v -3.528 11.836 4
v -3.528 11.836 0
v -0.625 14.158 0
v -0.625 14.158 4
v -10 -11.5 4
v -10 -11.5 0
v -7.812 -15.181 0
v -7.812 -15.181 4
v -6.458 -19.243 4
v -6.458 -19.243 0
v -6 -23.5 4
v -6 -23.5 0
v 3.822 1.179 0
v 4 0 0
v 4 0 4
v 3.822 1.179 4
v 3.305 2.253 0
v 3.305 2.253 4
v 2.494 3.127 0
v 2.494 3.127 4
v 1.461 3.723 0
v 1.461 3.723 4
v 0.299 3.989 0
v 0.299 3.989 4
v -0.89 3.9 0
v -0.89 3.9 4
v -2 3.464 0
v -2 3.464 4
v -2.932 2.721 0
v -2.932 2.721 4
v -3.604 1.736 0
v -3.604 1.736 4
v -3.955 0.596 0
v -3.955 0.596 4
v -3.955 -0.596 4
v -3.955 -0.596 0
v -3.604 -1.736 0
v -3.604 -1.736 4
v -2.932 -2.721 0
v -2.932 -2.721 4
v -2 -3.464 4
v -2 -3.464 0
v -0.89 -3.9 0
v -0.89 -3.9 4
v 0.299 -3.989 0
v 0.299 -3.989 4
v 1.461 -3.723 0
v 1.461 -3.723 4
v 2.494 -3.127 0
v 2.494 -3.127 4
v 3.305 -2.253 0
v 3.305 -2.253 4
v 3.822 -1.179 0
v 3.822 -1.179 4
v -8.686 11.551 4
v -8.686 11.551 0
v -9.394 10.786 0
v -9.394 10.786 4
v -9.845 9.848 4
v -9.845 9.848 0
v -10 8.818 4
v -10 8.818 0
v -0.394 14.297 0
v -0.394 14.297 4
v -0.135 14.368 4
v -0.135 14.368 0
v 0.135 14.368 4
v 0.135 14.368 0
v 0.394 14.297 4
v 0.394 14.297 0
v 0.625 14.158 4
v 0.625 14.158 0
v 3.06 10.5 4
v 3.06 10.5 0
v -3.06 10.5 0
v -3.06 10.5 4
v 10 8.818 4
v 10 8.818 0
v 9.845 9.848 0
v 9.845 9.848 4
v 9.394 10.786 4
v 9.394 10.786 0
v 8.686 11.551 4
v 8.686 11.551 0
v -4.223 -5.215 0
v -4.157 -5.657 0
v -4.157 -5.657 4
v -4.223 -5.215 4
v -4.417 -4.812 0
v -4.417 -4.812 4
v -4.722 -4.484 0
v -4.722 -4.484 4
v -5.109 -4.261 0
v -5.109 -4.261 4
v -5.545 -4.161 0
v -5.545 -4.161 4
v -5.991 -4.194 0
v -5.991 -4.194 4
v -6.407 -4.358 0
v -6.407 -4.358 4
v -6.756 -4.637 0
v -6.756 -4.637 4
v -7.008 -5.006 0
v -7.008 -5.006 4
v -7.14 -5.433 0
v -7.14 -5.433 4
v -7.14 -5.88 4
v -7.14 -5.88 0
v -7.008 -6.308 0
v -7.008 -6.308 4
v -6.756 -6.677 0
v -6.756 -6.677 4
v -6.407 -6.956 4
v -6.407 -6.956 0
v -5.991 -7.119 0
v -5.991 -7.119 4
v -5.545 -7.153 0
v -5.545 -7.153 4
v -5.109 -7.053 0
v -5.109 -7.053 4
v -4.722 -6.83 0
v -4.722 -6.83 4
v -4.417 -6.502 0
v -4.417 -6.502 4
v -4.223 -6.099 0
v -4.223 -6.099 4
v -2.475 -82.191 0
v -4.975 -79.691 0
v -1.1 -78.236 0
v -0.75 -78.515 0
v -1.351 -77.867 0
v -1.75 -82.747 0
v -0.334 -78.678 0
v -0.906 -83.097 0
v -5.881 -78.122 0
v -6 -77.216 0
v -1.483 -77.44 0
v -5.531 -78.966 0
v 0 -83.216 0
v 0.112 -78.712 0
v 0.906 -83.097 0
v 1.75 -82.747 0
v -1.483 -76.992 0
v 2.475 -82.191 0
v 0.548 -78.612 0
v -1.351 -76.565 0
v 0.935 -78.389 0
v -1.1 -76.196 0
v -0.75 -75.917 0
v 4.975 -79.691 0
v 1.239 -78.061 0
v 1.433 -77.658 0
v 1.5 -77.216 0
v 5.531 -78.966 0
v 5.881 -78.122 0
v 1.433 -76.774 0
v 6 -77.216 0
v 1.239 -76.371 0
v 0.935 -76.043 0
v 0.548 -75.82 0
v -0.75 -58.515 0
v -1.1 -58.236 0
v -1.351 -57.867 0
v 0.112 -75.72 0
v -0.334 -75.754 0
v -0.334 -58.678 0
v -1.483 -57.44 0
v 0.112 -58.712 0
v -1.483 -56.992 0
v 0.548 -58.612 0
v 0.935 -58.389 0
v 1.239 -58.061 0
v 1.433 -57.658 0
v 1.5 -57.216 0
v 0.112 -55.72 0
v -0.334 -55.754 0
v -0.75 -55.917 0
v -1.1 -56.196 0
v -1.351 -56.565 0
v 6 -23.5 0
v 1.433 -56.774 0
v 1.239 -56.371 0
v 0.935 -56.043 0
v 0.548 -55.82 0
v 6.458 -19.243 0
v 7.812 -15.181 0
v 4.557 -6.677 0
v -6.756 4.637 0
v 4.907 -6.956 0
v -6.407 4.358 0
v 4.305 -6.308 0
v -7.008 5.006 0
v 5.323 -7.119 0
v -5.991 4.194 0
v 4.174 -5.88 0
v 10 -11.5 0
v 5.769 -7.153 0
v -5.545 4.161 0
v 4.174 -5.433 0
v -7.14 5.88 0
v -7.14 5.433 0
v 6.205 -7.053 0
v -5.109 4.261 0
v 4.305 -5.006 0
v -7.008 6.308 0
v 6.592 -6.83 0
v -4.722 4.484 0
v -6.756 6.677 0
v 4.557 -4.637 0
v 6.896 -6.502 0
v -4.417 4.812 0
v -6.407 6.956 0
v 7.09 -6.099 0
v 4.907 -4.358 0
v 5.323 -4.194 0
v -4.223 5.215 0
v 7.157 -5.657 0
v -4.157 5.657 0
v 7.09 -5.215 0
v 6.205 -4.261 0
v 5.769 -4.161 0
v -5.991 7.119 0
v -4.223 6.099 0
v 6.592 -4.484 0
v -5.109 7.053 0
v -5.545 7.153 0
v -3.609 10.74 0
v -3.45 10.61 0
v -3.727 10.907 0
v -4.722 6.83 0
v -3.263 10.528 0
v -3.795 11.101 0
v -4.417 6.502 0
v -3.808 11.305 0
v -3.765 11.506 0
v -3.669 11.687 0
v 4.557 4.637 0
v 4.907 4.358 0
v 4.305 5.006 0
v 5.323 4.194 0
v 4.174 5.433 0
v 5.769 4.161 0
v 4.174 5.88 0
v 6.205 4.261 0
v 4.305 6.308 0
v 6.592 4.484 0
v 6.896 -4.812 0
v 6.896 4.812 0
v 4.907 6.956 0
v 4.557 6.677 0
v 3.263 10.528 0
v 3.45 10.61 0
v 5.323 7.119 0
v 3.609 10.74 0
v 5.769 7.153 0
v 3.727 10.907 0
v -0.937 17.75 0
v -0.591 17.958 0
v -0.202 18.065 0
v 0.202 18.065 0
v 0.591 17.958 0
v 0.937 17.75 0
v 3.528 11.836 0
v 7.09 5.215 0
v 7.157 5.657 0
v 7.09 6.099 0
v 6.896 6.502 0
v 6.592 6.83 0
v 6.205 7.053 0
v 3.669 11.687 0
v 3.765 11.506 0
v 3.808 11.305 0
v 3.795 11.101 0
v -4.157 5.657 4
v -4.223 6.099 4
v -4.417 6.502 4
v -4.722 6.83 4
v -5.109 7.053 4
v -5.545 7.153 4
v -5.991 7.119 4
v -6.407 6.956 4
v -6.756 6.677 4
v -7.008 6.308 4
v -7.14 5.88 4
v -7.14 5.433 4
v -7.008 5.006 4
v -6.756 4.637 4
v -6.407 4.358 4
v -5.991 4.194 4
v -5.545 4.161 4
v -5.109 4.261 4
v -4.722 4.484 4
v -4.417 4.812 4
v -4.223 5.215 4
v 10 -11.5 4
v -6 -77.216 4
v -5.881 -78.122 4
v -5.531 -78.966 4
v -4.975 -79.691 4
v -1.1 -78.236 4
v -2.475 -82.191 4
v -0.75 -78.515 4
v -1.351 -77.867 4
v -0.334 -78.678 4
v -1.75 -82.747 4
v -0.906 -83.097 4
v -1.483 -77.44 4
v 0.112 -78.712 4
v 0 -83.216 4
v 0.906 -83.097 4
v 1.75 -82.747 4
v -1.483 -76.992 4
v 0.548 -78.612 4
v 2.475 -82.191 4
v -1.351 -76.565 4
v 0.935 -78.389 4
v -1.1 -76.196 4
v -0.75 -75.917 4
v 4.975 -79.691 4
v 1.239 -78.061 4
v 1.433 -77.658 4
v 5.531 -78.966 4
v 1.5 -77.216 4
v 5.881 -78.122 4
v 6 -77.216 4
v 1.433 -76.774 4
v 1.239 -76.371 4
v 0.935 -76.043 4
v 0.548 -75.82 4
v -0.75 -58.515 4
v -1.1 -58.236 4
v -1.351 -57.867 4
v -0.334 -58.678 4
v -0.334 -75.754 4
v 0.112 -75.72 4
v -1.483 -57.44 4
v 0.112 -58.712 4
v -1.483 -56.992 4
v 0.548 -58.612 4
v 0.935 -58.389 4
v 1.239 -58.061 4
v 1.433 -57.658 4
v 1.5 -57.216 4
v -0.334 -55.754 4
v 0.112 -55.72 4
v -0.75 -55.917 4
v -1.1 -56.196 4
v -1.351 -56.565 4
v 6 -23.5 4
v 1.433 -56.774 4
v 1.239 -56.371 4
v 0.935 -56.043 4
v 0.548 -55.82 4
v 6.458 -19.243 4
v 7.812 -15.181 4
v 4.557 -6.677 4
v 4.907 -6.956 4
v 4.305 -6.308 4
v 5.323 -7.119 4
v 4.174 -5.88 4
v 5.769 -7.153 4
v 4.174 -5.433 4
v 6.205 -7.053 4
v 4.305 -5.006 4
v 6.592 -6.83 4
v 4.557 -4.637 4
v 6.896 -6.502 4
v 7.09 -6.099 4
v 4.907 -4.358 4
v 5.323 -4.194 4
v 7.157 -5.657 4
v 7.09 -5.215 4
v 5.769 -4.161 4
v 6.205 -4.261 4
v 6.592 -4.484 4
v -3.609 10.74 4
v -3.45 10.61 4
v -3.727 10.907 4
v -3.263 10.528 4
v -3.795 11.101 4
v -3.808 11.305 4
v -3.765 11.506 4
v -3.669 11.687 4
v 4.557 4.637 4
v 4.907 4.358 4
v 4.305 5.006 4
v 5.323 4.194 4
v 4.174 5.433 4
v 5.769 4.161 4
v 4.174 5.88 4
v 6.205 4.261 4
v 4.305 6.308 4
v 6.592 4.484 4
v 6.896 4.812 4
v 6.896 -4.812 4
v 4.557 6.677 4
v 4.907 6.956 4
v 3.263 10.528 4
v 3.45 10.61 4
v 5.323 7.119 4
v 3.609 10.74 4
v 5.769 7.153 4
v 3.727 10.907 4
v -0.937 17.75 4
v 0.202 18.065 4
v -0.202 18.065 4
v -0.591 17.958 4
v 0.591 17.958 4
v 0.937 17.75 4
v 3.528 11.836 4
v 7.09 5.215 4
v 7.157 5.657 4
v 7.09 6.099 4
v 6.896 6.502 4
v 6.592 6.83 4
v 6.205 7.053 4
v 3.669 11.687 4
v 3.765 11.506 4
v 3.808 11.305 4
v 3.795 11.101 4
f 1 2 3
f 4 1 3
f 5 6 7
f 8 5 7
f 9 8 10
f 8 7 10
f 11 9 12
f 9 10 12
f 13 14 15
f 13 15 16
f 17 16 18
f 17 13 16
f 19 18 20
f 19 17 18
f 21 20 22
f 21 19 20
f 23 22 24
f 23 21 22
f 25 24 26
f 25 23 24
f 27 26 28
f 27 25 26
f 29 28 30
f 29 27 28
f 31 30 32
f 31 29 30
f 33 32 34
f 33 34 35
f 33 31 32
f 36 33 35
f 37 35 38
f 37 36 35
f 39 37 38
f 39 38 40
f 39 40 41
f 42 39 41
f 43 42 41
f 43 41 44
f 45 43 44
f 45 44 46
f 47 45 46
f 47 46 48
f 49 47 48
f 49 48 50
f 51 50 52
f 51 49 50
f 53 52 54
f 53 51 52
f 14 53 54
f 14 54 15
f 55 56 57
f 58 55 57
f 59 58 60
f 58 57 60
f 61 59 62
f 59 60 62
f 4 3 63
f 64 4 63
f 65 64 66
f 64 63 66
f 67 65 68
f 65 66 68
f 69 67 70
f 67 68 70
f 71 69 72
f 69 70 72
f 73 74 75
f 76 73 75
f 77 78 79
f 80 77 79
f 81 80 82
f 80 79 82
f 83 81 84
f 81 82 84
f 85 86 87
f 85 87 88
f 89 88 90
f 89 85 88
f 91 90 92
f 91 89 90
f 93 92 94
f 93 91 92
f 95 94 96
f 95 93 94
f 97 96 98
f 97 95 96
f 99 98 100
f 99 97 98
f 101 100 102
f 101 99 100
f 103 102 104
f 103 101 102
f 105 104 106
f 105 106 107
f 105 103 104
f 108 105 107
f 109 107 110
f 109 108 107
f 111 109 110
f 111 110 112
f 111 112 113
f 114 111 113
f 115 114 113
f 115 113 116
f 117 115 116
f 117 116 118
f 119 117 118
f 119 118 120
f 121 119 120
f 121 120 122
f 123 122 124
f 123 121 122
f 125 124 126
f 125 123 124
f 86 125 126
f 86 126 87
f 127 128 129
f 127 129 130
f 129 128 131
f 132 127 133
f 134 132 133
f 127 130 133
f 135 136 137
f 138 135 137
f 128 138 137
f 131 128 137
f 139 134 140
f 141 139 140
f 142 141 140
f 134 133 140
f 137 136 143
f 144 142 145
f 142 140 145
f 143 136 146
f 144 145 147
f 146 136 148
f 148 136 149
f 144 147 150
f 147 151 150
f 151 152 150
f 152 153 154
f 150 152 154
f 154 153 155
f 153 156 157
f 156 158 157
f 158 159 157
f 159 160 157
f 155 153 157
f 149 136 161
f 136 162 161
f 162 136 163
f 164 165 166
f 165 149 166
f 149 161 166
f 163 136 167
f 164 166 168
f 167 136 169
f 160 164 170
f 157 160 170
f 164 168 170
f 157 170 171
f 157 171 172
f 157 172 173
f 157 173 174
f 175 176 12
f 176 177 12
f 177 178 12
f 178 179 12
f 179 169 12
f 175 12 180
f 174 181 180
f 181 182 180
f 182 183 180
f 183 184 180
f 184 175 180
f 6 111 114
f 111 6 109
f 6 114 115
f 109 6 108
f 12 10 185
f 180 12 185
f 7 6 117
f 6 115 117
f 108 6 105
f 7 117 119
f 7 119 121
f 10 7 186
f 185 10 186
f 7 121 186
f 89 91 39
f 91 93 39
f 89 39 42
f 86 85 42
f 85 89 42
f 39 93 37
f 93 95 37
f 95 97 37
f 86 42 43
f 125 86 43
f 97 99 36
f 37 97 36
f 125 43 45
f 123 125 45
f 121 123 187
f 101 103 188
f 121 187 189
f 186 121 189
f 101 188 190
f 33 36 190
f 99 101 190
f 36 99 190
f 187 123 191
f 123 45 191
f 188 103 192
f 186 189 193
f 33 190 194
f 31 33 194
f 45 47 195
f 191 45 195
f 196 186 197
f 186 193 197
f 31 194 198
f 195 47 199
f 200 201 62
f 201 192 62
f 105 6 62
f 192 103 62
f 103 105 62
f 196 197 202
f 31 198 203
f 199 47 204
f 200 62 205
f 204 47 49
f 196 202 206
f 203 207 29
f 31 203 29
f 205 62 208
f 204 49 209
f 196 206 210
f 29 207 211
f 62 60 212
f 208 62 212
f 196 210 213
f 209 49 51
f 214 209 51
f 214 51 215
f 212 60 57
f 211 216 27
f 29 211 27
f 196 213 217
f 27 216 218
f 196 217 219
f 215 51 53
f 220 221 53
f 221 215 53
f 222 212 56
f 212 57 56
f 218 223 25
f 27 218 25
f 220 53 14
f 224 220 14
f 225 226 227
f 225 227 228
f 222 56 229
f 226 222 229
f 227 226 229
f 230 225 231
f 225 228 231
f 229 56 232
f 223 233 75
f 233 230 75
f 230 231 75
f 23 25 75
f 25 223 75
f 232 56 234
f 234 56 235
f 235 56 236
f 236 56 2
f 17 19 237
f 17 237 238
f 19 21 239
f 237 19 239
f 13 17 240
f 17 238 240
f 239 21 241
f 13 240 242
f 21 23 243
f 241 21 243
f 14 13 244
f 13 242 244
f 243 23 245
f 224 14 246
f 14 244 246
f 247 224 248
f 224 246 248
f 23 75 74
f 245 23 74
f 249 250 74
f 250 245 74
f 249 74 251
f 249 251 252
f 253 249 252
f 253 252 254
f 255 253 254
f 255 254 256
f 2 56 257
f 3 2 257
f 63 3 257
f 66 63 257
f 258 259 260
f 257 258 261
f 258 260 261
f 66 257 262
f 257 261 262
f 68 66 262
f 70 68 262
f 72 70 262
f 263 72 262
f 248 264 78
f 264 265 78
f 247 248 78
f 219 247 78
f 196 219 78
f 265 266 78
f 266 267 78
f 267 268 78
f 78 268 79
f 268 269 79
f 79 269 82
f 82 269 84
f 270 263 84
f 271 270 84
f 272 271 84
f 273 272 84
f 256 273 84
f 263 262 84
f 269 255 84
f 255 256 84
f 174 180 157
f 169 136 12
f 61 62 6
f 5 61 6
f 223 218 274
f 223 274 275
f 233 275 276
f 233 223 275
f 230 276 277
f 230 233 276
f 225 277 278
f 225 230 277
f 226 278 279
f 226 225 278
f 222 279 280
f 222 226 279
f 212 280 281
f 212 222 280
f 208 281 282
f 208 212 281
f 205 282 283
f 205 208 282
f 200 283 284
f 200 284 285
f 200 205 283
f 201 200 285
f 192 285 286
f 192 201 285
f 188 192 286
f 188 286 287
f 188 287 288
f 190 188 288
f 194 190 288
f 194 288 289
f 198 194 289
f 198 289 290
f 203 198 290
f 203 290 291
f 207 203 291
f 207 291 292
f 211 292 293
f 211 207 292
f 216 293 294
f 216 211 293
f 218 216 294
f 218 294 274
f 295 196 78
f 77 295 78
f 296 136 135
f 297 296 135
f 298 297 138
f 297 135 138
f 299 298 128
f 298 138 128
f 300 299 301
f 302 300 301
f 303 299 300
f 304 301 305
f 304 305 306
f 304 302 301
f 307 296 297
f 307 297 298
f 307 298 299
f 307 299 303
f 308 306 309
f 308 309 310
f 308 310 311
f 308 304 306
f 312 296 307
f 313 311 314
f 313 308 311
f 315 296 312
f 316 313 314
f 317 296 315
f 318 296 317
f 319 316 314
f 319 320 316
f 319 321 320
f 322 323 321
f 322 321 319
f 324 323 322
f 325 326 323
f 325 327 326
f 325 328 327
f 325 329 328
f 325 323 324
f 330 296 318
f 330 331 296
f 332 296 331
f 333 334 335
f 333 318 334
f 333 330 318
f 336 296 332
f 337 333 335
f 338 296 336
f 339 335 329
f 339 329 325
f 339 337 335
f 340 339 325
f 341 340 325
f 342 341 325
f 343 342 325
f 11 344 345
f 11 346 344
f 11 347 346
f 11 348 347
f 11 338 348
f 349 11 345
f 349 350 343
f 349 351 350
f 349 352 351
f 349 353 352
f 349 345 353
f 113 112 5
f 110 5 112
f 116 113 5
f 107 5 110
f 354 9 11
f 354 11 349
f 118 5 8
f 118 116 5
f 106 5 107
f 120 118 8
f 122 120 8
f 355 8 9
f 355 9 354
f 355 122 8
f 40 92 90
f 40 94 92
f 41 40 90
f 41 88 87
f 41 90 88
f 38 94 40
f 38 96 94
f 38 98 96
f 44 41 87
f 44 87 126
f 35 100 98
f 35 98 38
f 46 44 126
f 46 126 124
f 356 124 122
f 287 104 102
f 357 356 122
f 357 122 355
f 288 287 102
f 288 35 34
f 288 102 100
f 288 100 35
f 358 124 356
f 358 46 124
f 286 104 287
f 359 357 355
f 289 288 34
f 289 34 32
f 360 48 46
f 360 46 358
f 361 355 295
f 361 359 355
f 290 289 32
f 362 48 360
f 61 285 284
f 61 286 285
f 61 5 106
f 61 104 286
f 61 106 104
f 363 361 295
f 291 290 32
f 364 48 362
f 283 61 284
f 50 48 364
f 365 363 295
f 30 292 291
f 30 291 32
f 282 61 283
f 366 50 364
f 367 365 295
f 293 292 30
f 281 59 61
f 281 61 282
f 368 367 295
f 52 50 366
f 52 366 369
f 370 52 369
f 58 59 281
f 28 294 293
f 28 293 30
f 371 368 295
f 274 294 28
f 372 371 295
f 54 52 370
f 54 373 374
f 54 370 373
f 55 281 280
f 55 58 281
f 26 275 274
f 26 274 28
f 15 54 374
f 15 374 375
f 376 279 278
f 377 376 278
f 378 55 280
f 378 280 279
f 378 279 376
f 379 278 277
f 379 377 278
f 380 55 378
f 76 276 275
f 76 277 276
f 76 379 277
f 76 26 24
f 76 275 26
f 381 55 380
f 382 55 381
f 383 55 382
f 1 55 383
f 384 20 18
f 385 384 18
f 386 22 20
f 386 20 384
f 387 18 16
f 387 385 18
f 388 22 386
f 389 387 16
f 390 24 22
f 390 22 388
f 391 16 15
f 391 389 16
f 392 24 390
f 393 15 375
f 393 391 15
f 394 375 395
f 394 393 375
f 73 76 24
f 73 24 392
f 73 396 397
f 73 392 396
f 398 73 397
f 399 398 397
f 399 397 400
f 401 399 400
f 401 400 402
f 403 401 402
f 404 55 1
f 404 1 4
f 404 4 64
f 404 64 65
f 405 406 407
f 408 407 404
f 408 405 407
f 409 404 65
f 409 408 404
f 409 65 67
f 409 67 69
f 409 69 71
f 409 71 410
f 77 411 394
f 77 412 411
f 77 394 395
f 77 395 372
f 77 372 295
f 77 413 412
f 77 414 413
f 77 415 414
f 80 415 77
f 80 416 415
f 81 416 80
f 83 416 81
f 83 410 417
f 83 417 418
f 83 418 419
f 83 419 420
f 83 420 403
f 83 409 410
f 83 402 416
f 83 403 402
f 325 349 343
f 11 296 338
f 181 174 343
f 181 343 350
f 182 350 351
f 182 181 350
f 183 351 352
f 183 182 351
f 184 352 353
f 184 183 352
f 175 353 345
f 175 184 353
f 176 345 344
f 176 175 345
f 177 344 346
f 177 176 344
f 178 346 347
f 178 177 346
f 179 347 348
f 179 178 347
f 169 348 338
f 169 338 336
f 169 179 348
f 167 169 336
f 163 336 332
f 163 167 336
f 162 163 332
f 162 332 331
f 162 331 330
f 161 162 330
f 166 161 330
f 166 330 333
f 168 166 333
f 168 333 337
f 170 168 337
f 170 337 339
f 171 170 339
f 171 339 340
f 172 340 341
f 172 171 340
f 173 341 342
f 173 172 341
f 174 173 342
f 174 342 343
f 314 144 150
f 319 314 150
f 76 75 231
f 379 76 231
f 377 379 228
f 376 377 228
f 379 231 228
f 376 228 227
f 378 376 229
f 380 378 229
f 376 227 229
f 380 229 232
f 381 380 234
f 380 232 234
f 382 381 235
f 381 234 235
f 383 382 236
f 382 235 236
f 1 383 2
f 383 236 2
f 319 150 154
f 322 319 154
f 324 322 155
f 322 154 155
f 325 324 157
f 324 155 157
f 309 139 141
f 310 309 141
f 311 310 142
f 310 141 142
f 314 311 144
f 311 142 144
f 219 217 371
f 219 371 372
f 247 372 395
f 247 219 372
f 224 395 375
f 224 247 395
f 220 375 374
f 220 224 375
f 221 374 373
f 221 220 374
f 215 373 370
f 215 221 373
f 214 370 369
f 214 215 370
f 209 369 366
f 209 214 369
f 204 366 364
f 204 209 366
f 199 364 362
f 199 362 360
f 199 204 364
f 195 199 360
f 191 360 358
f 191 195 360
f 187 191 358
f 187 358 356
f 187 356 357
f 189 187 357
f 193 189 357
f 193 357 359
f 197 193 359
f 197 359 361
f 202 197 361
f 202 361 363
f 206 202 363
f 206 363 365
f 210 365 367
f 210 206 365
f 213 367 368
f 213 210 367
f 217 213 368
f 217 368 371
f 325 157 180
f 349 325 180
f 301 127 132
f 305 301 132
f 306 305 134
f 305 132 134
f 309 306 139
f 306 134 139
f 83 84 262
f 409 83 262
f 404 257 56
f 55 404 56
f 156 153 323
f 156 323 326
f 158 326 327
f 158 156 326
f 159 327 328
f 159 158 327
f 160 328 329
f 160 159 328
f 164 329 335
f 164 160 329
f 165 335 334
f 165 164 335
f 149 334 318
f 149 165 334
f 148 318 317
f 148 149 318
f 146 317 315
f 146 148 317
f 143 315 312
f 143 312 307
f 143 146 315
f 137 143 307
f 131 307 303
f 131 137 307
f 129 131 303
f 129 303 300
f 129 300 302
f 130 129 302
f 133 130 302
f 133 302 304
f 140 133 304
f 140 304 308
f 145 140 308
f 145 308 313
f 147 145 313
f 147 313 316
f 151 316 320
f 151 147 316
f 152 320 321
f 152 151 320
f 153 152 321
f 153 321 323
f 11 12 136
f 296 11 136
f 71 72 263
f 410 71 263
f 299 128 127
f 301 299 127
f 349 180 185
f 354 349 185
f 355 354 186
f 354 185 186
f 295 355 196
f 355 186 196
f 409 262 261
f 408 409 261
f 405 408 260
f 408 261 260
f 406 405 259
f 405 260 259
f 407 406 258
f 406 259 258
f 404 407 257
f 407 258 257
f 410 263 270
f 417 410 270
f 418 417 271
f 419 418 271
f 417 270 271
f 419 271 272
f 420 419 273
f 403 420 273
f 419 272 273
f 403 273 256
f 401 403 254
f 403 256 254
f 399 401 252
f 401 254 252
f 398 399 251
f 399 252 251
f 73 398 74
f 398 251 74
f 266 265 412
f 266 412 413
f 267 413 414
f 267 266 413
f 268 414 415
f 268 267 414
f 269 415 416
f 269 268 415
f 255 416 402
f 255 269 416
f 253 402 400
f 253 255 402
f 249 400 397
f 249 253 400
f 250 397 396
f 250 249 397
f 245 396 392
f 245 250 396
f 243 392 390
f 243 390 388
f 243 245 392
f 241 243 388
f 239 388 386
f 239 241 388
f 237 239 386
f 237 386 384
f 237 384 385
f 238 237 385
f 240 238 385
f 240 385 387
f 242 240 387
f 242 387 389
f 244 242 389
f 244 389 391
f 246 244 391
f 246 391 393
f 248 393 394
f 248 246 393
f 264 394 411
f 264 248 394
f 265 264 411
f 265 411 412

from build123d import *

# Parameters (mm, degrees)
F0_R     = 1.5
F0_R_2   = 4
F1_DEPTH = 4


with BuildPart() as f1:
    # F0 (on Top) → F1 (new body)
    with BuildSketch(Plane.XY):
        with BuildLine():
            Line((6, -77.216061), (6, -23.5))
            ThreePointArc((6, -23.5), (7.026334, -17.175445), (10, -11.5))
            Line((10, -11.5), (10, 8.817813))
            ThreePointArc((10, 8.817813), (9.654561, 10.333974), (8.686433, 11.550854))
            Line((8.686433, 11.550854), (0.937043, 17.750366))
            ThreePointArc((0.937043, 17.750366), (0, 18.079063), (-0.937043, 17.750366))
            Line((-0.937043, 17.750366), (-8.686433, 11.550854))
            ThreePointArc((-8.686433, 11.550854), (-9.654561, 10.333974), (-10, 8.817813))
            Line((-10, 8.817813), (-10, -11.5))
            ThreePointArc((-10, -11.5), (-7.026334, -17.175445), (-6, -23.5))
            Line((-6, -23.5), (-6, -77.216061))
            ThreePointArc((-6, -77.216061), (-5.733578, -78.555453), (-4.974874, -79.690934))
            Line((-4.974874, -79.690934), (-2.474874, -82.190934))
            ThreePointArc((-2.474874, -82.190934), (-1.339392, -82.949639), (0, -83.216061))
            ThreePointArc((0, -83.216061), (1.339392, -82.949639), (2.474874, -82.190934))
            Line((2.474874, -82.190934), (4.974874, -79.690934))
            ThreePointArc((4.974874, -79.690934), (5.733578, -78.555453), (6, -77.216061))
        make_face()
        with Locations((0, -77.216061)):
            Circle(F0_R, mode=Mode.SUBTRACT)
        with Locations((0, -57.216061)):
            Circle(F0_R, mode=Mode.SUBTRACT)
        with Locations((-5.656854, -5.656854)):
            Circle(F0_R, mode=Mode.SUBTRACT)
        with Locations((-5.656854, 5.656854)):
            Circle(F0_R, mode=Mode.SUBTRACT)
        Circle(F0_R_2, mode=Mode.SUBTRACT)
        with BuildLine():
            Line((3.059571, 10.5), (0, 10.5))
            Line((0, 10.5), (-3.059571, 10.5))
            ThreePointArc((-3.059571, 10.5), (-3.767292, 11.001745), (-3.528092, 11.835652))
            Line((-3.528092, 11.835652), (-0.624695, 14.158369))
            ThreePointArc((-0.624695, 14.158369), (0, 14.377501), (0.624695, 14.158369))
            Line((0.624695, 14.158369), (3.528092, 11.835652))
            ThreePointArc((3.528092, 11.835652), (3.767292, 11.001745), (3.059571, 10.5))
        make_face(mode=Mode.SUBTRACT)
        with Locations((5.656854, -5.656854)):
            Circle(F0_R, mode=Mode.SUBTRACT)
        with Locations((5.656854, 5.656854)):
            Circle(F0_R, mode=Mode.SUBTRACT)
    extrude(amount=F1_DEPTH)


solid = f1.part
